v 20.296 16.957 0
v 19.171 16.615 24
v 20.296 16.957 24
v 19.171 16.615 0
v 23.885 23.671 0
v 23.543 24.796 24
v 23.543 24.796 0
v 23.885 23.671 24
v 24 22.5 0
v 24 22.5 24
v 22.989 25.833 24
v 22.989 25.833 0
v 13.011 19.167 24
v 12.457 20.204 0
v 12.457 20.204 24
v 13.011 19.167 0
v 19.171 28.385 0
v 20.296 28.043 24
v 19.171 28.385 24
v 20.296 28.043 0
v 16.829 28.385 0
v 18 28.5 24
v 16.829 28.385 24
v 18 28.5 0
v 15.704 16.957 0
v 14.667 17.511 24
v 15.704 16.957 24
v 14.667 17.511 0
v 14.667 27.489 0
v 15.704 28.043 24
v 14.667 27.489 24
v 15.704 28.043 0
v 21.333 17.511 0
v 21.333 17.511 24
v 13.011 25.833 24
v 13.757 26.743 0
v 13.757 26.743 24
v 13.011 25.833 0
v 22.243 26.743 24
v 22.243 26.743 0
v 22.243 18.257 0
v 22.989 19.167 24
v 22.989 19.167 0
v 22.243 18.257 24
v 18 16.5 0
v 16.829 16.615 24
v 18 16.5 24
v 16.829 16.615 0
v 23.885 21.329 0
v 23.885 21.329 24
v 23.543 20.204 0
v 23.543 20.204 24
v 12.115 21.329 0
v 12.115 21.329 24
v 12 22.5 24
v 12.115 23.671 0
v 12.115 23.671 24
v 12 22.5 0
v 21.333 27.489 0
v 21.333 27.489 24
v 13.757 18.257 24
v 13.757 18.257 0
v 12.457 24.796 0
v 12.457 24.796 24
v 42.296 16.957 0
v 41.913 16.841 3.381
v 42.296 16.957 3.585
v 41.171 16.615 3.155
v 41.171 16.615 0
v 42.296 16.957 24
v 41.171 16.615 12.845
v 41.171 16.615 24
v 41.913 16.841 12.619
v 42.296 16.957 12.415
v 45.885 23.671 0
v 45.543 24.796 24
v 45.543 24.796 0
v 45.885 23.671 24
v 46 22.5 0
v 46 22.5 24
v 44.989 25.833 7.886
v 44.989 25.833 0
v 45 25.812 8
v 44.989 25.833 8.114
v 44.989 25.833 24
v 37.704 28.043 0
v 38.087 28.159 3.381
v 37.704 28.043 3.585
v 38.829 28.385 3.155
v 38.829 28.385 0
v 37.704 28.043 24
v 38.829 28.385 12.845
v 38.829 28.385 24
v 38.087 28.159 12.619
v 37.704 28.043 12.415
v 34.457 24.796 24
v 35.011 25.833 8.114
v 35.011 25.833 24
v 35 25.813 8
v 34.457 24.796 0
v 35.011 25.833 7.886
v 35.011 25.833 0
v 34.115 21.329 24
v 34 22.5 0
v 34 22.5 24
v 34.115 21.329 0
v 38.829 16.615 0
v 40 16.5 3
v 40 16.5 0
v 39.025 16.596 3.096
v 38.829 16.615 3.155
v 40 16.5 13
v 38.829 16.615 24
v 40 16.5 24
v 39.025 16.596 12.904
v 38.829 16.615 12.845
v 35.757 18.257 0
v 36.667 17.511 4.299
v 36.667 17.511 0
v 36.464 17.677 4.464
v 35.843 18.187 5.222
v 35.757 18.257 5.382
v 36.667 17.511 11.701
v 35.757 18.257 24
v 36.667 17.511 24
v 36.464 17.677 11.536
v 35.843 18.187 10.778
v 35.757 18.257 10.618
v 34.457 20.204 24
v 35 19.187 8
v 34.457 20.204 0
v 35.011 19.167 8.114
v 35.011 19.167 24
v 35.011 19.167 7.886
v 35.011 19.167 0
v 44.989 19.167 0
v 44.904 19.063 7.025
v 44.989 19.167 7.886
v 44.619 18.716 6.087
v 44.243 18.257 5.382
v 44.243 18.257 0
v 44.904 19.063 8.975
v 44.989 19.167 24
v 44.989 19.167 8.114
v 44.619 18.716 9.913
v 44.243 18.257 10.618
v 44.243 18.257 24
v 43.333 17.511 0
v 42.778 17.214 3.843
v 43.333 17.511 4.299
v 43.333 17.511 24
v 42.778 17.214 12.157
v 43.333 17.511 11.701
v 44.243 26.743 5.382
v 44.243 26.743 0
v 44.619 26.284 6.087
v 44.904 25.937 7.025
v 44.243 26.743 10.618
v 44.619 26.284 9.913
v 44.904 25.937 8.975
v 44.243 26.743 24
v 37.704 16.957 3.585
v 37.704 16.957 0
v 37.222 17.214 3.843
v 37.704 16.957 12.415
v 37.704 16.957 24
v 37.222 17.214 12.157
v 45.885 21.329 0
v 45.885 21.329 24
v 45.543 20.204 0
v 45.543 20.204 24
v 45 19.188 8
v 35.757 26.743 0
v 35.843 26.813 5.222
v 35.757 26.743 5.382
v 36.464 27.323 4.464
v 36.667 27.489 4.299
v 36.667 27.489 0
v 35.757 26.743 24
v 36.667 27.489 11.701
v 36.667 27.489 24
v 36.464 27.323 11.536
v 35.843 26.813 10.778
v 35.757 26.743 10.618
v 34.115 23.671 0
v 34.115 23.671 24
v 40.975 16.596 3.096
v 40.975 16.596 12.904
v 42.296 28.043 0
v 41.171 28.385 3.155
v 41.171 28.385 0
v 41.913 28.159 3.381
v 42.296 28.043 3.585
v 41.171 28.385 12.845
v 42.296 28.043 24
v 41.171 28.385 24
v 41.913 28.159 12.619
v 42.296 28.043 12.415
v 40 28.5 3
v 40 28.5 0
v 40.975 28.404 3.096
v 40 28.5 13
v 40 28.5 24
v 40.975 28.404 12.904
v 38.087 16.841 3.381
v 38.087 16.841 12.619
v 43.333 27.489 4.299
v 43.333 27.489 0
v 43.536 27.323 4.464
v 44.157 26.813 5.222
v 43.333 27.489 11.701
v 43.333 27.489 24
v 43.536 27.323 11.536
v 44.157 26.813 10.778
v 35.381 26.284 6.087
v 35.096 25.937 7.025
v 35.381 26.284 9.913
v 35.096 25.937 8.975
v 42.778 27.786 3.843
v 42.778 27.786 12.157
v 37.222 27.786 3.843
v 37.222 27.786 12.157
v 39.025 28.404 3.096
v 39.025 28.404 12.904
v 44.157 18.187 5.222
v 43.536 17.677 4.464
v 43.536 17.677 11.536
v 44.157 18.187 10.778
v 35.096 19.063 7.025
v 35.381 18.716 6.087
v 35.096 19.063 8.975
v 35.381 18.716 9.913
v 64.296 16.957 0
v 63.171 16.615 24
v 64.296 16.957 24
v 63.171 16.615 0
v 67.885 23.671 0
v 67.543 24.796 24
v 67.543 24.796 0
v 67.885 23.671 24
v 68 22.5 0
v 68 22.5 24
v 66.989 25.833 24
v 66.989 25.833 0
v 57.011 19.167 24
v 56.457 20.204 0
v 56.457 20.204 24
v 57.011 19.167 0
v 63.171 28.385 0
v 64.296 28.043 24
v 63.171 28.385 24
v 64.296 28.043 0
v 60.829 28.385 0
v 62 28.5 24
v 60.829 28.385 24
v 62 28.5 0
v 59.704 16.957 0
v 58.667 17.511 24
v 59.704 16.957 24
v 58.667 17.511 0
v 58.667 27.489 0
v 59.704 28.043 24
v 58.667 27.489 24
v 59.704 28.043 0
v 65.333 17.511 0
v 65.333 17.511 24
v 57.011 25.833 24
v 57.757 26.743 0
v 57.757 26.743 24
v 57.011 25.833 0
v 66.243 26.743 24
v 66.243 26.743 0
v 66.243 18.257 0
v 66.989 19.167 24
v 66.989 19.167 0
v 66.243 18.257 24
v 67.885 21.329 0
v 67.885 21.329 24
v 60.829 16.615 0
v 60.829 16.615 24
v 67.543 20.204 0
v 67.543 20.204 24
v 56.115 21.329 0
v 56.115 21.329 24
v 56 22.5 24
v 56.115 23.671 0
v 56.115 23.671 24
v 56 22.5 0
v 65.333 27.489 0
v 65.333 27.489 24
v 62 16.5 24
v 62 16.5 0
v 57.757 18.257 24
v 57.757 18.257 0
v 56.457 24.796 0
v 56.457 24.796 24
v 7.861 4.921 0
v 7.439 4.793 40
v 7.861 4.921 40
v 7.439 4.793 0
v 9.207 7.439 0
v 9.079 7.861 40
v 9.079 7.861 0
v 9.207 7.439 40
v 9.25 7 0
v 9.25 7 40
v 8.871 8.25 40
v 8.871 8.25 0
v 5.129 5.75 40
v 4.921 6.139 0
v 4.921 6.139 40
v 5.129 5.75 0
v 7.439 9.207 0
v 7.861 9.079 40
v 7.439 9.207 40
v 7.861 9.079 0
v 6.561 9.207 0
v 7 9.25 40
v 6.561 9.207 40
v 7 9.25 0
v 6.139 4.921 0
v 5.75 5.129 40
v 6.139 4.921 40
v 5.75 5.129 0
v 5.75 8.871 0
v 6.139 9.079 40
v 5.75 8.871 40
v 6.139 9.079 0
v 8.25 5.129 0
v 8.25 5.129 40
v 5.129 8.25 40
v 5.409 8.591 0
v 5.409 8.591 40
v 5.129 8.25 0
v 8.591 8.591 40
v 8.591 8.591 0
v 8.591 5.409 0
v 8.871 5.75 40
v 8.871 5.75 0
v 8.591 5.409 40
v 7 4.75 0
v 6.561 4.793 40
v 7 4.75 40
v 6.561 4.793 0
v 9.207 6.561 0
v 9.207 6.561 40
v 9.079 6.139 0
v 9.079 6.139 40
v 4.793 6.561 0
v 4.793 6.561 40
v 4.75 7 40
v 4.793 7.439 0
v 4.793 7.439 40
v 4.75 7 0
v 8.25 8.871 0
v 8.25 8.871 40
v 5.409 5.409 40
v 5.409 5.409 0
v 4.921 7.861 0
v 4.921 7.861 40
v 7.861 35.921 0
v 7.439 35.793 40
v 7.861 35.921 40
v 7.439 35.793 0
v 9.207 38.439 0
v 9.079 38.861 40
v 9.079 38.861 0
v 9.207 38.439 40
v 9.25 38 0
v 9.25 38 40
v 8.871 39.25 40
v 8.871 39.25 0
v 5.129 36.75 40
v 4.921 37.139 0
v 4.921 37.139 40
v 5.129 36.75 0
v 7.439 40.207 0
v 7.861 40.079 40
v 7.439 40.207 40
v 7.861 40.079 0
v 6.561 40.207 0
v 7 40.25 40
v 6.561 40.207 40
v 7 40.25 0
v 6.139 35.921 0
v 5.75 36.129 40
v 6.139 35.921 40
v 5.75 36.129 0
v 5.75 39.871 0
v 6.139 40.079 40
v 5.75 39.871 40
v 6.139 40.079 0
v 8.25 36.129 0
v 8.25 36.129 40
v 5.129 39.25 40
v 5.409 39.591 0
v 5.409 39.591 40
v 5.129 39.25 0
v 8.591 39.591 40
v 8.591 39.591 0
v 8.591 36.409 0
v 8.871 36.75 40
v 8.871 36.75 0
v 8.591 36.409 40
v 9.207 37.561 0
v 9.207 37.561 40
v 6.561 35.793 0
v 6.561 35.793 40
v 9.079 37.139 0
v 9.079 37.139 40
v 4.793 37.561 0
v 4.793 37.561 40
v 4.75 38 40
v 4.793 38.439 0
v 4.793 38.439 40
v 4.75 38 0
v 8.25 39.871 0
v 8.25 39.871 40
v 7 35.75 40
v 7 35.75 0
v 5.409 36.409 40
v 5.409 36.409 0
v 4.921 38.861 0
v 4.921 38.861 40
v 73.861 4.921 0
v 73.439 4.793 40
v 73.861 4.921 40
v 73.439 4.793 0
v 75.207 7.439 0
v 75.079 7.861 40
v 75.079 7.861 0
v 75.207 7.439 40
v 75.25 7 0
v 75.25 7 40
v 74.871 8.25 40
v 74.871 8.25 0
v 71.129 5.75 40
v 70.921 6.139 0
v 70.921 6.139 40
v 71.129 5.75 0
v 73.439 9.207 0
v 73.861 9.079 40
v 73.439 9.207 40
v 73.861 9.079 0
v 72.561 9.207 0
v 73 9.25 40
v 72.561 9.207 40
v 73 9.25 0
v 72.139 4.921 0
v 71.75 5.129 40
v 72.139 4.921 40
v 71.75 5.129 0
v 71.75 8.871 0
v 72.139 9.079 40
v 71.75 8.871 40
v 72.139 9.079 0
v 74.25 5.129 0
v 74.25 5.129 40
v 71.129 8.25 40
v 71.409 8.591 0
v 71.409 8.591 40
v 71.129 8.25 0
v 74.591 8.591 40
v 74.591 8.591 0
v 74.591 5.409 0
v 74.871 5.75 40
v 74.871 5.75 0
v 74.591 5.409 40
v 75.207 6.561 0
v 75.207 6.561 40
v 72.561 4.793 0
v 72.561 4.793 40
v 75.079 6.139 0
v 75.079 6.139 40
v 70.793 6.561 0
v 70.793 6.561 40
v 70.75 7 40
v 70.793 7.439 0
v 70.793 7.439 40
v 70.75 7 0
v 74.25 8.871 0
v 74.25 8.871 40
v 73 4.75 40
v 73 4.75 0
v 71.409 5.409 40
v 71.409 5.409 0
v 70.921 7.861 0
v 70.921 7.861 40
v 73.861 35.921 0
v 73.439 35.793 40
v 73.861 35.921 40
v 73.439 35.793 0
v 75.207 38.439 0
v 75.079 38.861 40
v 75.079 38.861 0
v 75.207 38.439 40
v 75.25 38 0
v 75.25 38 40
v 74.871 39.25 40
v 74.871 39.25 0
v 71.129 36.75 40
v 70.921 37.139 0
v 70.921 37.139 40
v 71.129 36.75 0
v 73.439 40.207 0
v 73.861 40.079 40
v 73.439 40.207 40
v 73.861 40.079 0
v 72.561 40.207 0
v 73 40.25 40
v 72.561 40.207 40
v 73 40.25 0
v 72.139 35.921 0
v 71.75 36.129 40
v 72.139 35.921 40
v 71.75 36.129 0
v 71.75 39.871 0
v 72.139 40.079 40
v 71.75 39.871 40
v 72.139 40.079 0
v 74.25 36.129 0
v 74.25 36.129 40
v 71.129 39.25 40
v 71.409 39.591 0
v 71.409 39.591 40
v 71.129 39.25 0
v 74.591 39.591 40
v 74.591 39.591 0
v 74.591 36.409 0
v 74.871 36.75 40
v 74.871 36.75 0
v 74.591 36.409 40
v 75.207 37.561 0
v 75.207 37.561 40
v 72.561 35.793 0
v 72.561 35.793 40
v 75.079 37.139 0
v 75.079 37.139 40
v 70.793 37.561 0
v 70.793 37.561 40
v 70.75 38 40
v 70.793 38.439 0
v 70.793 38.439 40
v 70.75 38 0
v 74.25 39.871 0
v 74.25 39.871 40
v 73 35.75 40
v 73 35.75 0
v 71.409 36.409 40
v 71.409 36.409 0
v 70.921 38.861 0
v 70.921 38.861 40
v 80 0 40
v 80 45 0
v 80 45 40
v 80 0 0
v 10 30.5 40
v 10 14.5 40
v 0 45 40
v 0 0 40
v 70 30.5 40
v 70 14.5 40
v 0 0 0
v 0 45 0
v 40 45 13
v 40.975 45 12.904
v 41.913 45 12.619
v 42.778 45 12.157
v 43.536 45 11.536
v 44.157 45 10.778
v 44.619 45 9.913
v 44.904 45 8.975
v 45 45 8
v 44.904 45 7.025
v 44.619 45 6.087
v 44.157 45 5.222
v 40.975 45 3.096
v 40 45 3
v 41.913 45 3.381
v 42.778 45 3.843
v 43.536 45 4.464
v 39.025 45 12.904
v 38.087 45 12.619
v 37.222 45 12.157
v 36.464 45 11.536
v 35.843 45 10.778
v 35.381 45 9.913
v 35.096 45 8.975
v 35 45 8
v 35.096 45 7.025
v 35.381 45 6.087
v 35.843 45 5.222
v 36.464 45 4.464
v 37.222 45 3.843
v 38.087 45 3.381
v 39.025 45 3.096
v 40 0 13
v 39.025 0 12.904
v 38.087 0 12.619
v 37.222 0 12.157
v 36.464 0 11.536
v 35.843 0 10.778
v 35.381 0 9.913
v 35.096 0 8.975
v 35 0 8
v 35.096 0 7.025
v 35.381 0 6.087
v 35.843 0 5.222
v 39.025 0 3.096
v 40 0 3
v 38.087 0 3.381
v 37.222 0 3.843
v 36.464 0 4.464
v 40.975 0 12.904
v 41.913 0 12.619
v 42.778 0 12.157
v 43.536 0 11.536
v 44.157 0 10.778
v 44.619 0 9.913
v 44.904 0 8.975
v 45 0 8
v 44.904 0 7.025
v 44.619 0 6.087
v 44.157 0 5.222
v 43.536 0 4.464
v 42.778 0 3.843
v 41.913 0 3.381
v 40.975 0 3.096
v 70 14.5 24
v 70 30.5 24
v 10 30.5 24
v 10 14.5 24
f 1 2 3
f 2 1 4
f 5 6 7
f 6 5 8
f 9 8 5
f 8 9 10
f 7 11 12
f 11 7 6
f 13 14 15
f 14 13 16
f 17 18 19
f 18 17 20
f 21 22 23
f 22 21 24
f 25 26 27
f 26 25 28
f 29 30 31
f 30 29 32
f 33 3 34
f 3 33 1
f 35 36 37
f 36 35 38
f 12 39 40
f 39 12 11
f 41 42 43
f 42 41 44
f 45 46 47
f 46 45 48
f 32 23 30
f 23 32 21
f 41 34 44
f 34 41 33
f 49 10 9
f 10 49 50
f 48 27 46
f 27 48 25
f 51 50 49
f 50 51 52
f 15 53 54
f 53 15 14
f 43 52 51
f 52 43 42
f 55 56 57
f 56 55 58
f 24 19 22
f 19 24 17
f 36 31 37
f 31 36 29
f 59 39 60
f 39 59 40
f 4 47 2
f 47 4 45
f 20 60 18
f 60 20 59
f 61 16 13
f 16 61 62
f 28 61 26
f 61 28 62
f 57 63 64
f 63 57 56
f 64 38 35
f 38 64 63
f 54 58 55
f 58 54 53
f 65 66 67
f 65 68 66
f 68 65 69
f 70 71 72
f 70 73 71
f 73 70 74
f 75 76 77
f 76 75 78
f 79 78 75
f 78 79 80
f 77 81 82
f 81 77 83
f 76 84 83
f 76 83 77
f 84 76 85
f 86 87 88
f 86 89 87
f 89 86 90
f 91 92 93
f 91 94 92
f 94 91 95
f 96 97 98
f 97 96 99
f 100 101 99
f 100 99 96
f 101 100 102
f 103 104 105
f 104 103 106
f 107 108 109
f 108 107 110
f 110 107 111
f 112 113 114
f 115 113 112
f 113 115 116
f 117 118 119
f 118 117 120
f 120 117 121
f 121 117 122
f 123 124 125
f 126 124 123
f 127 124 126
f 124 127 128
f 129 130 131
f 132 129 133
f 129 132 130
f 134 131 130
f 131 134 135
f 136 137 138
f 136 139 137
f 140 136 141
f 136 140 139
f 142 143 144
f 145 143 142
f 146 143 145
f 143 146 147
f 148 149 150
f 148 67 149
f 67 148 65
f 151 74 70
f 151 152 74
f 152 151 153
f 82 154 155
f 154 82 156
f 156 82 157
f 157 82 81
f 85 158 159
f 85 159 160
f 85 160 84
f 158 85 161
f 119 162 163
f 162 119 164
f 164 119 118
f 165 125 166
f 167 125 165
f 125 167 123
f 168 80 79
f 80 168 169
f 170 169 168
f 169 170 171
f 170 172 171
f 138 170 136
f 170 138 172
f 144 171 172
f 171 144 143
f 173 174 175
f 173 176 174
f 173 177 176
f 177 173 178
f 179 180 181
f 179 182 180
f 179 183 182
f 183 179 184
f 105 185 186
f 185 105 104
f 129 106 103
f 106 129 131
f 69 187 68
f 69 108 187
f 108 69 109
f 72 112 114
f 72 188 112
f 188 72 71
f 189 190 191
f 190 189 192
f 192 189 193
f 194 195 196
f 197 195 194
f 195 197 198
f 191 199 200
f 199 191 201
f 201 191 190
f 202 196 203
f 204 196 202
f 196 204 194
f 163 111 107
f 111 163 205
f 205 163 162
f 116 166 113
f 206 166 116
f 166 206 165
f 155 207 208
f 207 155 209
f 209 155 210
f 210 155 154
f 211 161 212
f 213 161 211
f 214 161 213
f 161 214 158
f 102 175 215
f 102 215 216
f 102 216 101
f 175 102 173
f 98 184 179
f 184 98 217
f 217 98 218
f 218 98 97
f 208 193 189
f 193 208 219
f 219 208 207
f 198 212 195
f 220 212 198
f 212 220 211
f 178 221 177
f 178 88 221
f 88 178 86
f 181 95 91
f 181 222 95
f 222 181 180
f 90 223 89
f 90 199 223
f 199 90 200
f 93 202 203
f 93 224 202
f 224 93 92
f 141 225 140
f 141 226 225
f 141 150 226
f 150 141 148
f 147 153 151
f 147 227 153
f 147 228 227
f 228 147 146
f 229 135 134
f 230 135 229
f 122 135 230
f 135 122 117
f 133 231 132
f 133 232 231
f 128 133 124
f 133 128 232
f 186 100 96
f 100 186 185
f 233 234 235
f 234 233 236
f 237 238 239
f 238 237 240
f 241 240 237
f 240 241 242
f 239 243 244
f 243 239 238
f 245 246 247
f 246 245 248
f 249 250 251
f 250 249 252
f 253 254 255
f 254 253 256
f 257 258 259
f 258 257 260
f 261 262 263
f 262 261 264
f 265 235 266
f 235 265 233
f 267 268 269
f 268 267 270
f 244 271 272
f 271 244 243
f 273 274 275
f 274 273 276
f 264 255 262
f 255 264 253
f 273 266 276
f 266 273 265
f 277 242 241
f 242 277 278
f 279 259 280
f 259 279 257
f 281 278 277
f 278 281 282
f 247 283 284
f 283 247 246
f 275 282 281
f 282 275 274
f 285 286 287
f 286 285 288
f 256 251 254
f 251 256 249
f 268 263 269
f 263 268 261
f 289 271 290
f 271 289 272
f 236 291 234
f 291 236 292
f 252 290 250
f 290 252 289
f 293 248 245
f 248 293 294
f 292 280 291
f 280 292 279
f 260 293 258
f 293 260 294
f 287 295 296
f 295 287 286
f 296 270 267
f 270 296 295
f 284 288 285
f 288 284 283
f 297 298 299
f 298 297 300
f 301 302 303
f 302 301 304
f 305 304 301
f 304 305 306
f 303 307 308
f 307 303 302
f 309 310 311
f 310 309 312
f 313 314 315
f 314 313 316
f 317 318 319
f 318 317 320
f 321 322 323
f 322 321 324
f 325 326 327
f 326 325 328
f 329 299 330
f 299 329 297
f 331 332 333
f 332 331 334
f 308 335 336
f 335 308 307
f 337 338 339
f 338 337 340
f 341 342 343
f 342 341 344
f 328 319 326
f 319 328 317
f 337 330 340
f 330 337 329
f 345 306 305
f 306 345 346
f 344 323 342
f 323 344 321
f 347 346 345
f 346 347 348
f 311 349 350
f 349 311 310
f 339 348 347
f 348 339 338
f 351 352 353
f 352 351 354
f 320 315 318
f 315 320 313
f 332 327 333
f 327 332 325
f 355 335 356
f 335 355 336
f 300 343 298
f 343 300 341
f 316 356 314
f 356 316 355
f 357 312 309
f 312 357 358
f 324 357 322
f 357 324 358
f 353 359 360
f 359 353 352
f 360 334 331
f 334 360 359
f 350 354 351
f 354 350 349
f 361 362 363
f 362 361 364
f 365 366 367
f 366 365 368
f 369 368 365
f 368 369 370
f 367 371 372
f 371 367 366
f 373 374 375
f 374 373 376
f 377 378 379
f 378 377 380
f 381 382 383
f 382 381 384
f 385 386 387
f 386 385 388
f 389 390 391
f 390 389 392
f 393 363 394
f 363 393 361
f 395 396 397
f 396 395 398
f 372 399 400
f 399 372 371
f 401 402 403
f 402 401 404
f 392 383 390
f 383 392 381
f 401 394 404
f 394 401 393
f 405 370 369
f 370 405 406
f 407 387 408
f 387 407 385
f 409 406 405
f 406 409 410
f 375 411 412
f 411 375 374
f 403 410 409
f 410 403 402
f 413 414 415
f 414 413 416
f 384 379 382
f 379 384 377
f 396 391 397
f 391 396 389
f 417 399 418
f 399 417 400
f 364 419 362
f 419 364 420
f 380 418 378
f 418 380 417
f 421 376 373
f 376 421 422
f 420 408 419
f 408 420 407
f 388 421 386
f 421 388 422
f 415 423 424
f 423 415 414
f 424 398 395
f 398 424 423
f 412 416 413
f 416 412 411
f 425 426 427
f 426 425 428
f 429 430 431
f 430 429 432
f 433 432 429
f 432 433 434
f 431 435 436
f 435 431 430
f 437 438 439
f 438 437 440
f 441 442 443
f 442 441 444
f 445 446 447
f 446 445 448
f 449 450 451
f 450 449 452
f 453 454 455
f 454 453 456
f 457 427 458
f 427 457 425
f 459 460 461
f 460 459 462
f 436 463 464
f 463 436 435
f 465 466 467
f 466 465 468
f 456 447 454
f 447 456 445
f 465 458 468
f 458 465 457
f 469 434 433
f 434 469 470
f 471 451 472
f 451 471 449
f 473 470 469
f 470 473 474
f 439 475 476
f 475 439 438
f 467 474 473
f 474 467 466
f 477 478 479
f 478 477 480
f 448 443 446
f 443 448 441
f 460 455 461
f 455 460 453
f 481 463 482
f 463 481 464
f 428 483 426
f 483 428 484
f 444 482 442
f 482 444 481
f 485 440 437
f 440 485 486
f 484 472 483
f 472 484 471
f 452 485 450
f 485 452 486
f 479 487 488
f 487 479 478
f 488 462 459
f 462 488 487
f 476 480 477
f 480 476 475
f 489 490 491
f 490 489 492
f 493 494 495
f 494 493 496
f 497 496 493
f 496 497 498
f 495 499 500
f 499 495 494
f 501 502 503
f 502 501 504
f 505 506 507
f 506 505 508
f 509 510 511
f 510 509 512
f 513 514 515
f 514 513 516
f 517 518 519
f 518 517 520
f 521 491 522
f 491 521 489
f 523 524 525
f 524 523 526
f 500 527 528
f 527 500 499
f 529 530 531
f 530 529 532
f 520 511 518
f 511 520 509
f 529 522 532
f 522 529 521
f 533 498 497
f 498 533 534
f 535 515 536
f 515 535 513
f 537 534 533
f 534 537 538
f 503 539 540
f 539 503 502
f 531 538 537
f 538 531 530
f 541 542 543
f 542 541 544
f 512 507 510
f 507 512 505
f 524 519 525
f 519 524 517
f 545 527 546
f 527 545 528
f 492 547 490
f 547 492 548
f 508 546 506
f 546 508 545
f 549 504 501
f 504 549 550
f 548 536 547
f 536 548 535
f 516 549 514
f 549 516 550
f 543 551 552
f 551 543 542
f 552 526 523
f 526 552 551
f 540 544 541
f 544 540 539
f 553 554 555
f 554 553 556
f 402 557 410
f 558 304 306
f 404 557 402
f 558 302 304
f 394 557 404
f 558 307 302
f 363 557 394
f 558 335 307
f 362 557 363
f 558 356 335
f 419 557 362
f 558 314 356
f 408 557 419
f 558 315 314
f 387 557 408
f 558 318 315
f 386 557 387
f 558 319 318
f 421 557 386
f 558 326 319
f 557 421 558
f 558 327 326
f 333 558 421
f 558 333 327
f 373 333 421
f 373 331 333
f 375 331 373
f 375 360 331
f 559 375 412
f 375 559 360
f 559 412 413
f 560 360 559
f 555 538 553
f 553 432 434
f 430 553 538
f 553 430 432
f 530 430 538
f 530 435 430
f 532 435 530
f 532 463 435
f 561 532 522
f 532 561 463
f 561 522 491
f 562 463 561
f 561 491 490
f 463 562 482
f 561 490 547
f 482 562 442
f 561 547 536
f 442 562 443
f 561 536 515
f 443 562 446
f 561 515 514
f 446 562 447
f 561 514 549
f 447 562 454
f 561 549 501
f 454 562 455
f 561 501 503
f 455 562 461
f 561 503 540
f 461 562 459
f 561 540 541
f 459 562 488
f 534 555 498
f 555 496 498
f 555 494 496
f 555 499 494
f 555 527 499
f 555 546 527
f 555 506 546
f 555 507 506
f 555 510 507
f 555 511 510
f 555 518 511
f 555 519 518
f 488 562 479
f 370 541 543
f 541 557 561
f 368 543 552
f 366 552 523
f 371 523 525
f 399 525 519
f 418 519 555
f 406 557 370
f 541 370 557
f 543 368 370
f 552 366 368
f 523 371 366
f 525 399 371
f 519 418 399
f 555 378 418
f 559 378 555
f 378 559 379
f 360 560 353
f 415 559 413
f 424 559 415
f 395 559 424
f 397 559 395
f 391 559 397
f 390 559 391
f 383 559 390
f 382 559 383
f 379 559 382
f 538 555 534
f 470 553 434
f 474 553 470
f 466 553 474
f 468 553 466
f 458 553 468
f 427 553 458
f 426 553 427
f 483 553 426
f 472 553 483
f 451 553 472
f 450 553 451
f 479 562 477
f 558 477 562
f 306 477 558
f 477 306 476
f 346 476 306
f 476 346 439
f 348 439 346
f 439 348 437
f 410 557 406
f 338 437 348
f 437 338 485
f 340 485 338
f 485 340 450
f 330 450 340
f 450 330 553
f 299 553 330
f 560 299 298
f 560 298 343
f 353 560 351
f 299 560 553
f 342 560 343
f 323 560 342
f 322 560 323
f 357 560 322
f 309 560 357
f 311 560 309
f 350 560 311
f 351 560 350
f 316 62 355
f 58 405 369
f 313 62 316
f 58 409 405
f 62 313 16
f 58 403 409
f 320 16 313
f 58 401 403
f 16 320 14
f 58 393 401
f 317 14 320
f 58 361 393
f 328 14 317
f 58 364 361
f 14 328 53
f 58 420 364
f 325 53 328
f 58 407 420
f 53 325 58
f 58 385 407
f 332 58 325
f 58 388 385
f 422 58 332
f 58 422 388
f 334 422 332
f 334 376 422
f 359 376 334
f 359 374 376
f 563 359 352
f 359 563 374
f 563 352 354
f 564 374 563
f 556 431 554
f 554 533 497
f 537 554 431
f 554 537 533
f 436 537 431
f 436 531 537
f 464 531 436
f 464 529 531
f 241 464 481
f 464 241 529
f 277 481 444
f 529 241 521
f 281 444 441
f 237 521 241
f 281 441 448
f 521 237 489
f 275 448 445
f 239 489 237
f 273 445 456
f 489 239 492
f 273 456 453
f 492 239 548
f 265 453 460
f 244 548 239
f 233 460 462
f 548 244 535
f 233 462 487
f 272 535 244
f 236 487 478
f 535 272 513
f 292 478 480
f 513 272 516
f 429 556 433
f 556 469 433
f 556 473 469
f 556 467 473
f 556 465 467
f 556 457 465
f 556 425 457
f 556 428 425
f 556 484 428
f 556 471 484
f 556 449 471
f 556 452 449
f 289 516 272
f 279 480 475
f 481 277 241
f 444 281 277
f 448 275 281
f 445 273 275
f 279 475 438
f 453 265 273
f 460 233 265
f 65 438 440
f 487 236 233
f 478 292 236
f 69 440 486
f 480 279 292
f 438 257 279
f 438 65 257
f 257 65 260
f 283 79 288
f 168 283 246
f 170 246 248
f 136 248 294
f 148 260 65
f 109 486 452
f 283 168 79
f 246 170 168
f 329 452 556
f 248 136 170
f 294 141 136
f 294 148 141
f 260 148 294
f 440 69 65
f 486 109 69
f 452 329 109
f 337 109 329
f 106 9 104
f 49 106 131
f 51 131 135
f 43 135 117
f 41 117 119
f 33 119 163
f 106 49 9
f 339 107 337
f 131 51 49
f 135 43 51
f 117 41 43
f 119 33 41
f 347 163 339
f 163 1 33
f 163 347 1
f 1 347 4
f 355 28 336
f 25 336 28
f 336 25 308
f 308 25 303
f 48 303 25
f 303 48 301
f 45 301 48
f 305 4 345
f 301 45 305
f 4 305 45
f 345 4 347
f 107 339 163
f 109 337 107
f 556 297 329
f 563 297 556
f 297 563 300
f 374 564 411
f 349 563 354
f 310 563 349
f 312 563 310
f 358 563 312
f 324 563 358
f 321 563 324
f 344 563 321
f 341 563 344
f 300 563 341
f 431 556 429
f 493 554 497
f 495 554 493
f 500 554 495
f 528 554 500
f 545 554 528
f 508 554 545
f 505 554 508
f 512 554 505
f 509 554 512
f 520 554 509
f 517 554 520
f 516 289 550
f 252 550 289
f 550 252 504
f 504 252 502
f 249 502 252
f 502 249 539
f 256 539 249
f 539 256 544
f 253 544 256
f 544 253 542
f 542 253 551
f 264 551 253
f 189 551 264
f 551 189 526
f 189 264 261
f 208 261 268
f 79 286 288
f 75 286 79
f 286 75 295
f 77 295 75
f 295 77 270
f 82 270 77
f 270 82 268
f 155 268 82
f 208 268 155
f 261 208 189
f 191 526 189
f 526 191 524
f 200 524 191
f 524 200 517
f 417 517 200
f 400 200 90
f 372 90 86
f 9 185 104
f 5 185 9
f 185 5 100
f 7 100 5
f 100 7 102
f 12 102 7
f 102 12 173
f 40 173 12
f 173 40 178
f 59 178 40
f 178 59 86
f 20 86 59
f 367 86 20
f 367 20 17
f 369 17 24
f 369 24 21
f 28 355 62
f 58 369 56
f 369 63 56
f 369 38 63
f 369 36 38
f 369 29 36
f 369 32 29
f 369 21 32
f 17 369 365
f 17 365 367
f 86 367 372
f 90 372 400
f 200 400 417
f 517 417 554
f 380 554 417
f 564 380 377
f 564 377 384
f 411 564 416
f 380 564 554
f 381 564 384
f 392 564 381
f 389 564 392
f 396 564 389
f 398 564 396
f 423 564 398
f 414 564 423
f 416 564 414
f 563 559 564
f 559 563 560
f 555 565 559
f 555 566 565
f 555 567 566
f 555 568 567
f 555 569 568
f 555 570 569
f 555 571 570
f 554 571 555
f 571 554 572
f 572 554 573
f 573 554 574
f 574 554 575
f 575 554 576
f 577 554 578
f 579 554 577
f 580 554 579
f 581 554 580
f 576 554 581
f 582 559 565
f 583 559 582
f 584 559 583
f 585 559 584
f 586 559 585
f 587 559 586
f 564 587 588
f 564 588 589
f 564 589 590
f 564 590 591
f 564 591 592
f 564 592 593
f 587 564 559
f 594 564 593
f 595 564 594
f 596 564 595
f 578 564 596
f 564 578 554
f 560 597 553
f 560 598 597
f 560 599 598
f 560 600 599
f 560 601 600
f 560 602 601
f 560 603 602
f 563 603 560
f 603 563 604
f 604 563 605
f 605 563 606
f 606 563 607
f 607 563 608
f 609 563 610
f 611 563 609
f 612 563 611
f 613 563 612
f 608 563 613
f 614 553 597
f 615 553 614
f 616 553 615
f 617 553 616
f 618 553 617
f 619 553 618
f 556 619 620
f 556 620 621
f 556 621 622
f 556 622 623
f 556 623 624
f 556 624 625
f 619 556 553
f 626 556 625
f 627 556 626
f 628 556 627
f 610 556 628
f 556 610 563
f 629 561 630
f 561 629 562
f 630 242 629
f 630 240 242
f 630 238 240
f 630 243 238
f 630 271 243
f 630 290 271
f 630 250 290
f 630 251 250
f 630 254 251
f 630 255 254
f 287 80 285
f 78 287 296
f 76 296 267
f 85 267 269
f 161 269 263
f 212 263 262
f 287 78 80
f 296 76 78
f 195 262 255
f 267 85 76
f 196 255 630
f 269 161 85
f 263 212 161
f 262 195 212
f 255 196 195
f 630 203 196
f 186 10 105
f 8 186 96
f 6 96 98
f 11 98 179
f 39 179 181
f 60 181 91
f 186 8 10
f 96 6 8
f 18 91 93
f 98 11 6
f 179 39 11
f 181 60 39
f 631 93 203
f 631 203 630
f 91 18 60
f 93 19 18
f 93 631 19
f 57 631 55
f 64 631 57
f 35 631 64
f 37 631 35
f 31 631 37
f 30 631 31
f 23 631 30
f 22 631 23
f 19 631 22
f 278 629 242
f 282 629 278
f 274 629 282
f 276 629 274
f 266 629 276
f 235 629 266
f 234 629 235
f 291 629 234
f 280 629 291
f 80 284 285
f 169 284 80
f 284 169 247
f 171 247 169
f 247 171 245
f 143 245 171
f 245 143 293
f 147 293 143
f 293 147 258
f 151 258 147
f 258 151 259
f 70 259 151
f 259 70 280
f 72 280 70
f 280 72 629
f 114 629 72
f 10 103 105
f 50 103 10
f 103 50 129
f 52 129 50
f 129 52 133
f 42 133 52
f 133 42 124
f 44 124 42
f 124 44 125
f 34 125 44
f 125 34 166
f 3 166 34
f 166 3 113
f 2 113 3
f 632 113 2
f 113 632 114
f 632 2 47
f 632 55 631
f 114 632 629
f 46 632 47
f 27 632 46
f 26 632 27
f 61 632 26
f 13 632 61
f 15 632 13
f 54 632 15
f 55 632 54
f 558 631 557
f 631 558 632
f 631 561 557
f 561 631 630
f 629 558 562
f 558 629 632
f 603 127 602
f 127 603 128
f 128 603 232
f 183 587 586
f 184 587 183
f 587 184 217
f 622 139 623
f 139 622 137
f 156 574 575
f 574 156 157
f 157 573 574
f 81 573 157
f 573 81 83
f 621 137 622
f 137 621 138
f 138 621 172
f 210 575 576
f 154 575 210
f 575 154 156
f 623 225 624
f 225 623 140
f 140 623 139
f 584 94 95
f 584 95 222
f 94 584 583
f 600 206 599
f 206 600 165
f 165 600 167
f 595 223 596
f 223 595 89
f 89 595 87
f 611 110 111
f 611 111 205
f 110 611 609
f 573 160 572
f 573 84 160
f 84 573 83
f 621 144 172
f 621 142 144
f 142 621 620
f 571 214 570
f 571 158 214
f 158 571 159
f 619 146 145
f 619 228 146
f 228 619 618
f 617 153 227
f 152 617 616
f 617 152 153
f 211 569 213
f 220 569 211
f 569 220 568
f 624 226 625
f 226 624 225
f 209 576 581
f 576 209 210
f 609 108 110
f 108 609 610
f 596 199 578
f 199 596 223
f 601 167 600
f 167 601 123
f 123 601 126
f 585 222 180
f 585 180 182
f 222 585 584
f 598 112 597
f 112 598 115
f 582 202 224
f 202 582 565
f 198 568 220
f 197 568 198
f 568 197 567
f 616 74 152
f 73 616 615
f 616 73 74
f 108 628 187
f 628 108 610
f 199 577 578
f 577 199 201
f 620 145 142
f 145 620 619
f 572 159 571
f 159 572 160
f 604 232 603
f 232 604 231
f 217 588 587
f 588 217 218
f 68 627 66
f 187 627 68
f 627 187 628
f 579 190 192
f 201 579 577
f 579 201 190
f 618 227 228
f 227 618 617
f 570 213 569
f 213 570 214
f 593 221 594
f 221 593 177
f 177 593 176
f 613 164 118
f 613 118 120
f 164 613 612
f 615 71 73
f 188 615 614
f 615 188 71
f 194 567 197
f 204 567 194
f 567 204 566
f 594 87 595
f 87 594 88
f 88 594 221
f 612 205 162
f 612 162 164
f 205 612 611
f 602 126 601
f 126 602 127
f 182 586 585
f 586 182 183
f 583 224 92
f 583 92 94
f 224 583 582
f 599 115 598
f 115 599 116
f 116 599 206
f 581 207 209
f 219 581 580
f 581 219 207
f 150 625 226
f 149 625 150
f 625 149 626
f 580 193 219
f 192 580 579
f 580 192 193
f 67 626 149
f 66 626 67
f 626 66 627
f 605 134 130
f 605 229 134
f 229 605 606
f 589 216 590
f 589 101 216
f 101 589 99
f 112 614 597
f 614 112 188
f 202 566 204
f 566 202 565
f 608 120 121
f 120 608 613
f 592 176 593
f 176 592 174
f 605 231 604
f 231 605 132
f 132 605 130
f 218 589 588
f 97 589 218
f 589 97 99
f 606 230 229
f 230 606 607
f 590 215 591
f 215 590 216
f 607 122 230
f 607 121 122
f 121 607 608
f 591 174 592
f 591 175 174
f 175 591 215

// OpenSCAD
$fn = 32;

// ----------------------------------------------------------------------
// Manifold block: side_outlet manifold
// ----------------------------------------------------------------------

// --- parameters (mm) ---
block_l = 80;             // block length, X
block_w = 45;             // block width, Y
block_h = 40;             // block height, Z
port_d = 12;              // port bore diameter
port_pitch = 22;          // port pitch along X
gallery_d = 16;           // top gallery width, Y
gallery_depth = 16;       // gallery pocket depth
wall_p = 10;              // gallery end wall thickness, X
mnt_d = 4.5;              // mounting hole diameter
mnt_in = 7;               // mounting hole inset from the edges
out_d = 10;               // outlet bore diameter
out_z = 8;                // outlet axis height

n_ports = 3;  // ports in the row
port_x0 = (block_l - (n_ports - 1) * port_pitch) / 2;  // first port X

difference() {
  cube([block_l, block_w, block_h]);
  for (i = [0 : n_ports - 1])
    translate([port_x0 + i * port_pitch, block_w / 2, -1])
      cylinder(h = block_h + 2, d = port_d);
  translate([wall_p, block_w / 2 - gallery_d / 2, block_h - gallery_depth])
    cube([block_l - 2 * wall_p, gallery_d, gallery_depth + 1]);
  for (cx = [mnt_in, block_l - mnt_in])
    for (cy = [mnt_in, block_w - mnt_in])
      translate([cx, cy, -1]) cylinder(h = block_h + 2, d = mnt_d);
  translate([block_l / 2, -1, out_z]) rotate([-90, 0, 0])
    cylinder(h = block_w + 2, d = out_d);
}
